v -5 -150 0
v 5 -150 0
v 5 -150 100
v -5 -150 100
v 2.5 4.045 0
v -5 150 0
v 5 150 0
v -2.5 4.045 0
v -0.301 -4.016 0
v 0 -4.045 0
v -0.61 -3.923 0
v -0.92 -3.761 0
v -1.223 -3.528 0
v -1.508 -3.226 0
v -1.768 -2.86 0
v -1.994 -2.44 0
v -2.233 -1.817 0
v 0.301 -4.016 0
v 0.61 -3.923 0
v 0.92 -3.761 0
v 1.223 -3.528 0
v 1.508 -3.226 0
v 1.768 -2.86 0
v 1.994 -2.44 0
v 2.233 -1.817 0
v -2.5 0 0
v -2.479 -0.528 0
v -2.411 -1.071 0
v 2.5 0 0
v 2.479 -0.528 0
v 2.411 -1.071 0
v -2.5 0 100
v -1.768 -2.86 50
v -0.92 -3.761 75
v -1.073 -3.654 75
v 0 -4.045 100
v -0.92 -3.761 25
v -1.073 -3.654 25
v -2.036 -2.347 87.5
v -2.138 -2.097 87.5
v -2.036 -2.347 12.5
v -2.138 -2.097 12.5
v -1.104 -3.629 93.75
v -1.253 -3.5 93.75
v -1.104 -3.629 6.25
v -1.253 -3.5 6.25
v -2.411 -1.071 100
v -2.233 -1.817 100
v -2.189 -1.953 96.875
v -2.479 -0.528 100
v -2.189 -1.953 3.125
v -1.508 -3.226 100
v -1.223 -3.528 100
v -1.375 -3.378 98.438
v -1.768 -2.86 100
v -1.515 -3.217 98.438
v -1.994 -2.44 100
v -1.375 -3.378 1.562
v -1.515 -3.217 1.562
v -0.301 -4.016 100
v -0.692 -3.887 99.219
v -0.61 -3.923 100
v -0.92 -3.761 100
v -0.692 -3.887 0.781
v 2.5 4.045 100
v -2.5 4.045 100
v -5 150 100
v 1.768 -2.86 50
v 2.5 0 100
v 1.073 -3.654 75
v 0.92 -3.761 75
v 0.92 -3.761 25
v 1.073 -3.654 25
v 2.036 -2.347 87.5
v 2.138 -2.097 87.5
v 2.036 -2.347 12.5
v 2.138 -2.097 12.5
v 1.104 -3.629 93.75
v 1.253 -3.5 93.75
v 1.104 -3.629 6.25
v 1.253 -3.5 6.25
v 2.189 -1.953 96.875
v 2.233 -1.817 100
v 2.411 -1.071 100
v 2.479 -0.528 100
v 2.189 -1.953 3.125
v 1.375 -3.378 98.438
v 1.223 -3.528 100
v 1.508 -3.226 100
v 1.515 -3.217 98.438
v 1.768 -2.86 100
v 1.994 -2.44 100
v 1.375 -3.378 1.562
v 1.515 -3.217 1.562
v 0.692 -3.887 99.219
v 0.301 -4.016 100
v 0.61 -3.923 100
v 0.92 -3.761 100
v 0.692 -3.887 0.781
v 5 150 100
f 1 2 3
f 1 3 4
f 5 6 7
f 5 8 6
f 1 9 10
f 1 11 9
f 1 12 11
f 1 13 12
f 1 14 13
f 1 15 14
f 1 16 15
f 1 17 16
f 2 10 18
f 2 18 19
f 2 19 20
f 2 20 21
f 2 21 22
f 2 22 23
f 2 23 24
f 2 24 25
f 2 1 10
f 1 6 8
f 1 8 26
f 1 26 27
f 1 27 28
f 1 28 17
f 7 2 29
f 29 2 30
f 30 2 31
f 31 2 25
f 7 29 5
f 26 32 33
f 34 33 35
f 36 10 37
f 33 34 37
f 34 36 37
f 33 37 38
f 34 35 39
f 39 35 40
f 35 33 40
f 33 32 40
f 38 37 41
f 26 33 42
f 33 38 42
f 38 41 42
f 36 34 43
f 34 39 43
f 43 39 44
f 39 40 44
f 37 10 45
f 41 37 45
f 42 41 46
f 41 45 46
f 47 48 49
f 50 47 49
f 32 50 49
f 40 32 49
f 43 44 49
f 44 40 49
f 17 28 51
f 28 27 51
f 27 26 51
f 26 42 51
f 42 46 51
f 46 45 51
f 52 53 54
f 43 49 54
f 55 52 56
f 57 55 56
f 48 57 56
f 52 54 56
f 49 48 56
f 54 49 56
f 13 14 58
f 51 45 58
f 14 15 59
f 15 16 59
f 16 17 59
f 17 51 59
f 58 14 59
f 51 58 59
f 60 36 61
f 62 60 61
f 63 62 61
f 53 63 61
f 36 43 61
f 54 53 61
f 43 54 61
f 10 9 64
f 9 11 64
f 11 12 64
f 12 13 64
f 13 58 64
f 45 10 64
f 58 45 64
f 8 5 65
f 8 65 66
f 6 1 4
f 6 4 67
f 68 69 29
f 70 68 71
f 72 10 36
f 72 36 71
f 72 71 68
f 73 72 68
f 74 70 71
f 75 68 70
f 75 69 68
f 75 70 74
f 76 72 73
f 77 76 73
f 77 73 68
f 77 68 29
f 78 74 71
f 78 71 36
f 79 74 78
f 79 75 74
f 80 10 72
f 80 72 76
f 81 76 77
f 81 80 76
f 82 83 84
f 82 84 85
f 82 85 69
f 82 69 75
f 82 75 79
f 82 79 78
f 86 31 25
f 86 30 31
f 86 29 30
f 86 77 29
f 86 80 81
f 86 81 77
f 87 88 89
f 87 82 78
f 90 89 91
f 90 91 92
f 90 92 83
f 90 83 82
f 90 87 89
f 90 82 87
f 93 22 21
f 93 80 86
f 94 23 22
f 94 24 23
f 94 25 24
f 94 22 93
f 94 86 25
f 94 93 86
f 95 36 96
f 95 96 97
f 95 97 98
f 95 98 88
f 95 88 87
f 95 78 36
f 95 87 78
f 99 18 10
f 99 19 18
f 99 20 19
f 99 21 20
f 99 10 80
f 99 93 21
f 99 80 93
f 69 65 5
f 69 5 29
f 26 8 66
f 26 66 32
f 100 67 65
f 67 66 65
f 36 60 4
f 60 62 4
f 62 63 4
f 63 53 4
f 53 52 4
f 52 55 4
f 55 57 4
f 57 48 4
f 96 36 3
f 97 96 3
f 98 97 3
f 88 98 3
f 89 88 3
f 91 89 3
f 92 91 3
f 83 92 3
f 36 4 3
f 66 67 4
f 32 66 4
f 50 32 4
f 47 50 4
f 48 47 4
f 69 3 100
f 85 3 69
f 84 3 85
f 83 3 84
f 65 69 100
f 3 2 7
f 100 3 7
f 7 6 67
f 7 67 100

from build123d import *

# Parameters (mm, degrees)
F2_DEPTH = 100
F6_ANGLE = 180


with BuildPart() as f2:
    # F1 (on Top) → F2 (new body)
    with BuildSketch(Plane.XY):
        with BuildLine():
            Line((5, 4.045), (5, 150))
            Line((5, 150), (0, 150))
            Line((0, 150), (0, -150))
            Line((0, -150), (5, -150))
            Line((5, -150), (5, -4.045))
            Line((5, -4.045), (2.5, -4.045))
            Line((2.5, -4.045), (2.5, 0))
            add(Edge.make_bspline(
                [(5, 4.045), (2.5, 4.045), (2.5, 0)],
                knots=[0, 0, 0, 1.5707963268, 1.5707963268, 1.5707963268], degree=2, weights=[1, 0.7071067812, 1]))
        make_face()
    extrude(amount=F2_DEPTH)


with BuildPart() as f2_1:
    # F4: moved
    add(f2.part.moved(Location((-5, 0, 0))))

    # F5: F2 across plane


with BuildPart() as f2_2:
    add(f2_1.part)
    add(f2_1.part.mirror(Plane.YZ))


with BuildPart() as f2_3:
    # F6: moved
    add(f2_2.part.rotate(Axis((5, -150, 50), (0, 0, -1)), F6_ANGLE))


with BuildPart() as f2_4:
    # F9: moved
    add(f2_3.part.moved(Location((-10, 300, 0))))


solid = f2_4.part
